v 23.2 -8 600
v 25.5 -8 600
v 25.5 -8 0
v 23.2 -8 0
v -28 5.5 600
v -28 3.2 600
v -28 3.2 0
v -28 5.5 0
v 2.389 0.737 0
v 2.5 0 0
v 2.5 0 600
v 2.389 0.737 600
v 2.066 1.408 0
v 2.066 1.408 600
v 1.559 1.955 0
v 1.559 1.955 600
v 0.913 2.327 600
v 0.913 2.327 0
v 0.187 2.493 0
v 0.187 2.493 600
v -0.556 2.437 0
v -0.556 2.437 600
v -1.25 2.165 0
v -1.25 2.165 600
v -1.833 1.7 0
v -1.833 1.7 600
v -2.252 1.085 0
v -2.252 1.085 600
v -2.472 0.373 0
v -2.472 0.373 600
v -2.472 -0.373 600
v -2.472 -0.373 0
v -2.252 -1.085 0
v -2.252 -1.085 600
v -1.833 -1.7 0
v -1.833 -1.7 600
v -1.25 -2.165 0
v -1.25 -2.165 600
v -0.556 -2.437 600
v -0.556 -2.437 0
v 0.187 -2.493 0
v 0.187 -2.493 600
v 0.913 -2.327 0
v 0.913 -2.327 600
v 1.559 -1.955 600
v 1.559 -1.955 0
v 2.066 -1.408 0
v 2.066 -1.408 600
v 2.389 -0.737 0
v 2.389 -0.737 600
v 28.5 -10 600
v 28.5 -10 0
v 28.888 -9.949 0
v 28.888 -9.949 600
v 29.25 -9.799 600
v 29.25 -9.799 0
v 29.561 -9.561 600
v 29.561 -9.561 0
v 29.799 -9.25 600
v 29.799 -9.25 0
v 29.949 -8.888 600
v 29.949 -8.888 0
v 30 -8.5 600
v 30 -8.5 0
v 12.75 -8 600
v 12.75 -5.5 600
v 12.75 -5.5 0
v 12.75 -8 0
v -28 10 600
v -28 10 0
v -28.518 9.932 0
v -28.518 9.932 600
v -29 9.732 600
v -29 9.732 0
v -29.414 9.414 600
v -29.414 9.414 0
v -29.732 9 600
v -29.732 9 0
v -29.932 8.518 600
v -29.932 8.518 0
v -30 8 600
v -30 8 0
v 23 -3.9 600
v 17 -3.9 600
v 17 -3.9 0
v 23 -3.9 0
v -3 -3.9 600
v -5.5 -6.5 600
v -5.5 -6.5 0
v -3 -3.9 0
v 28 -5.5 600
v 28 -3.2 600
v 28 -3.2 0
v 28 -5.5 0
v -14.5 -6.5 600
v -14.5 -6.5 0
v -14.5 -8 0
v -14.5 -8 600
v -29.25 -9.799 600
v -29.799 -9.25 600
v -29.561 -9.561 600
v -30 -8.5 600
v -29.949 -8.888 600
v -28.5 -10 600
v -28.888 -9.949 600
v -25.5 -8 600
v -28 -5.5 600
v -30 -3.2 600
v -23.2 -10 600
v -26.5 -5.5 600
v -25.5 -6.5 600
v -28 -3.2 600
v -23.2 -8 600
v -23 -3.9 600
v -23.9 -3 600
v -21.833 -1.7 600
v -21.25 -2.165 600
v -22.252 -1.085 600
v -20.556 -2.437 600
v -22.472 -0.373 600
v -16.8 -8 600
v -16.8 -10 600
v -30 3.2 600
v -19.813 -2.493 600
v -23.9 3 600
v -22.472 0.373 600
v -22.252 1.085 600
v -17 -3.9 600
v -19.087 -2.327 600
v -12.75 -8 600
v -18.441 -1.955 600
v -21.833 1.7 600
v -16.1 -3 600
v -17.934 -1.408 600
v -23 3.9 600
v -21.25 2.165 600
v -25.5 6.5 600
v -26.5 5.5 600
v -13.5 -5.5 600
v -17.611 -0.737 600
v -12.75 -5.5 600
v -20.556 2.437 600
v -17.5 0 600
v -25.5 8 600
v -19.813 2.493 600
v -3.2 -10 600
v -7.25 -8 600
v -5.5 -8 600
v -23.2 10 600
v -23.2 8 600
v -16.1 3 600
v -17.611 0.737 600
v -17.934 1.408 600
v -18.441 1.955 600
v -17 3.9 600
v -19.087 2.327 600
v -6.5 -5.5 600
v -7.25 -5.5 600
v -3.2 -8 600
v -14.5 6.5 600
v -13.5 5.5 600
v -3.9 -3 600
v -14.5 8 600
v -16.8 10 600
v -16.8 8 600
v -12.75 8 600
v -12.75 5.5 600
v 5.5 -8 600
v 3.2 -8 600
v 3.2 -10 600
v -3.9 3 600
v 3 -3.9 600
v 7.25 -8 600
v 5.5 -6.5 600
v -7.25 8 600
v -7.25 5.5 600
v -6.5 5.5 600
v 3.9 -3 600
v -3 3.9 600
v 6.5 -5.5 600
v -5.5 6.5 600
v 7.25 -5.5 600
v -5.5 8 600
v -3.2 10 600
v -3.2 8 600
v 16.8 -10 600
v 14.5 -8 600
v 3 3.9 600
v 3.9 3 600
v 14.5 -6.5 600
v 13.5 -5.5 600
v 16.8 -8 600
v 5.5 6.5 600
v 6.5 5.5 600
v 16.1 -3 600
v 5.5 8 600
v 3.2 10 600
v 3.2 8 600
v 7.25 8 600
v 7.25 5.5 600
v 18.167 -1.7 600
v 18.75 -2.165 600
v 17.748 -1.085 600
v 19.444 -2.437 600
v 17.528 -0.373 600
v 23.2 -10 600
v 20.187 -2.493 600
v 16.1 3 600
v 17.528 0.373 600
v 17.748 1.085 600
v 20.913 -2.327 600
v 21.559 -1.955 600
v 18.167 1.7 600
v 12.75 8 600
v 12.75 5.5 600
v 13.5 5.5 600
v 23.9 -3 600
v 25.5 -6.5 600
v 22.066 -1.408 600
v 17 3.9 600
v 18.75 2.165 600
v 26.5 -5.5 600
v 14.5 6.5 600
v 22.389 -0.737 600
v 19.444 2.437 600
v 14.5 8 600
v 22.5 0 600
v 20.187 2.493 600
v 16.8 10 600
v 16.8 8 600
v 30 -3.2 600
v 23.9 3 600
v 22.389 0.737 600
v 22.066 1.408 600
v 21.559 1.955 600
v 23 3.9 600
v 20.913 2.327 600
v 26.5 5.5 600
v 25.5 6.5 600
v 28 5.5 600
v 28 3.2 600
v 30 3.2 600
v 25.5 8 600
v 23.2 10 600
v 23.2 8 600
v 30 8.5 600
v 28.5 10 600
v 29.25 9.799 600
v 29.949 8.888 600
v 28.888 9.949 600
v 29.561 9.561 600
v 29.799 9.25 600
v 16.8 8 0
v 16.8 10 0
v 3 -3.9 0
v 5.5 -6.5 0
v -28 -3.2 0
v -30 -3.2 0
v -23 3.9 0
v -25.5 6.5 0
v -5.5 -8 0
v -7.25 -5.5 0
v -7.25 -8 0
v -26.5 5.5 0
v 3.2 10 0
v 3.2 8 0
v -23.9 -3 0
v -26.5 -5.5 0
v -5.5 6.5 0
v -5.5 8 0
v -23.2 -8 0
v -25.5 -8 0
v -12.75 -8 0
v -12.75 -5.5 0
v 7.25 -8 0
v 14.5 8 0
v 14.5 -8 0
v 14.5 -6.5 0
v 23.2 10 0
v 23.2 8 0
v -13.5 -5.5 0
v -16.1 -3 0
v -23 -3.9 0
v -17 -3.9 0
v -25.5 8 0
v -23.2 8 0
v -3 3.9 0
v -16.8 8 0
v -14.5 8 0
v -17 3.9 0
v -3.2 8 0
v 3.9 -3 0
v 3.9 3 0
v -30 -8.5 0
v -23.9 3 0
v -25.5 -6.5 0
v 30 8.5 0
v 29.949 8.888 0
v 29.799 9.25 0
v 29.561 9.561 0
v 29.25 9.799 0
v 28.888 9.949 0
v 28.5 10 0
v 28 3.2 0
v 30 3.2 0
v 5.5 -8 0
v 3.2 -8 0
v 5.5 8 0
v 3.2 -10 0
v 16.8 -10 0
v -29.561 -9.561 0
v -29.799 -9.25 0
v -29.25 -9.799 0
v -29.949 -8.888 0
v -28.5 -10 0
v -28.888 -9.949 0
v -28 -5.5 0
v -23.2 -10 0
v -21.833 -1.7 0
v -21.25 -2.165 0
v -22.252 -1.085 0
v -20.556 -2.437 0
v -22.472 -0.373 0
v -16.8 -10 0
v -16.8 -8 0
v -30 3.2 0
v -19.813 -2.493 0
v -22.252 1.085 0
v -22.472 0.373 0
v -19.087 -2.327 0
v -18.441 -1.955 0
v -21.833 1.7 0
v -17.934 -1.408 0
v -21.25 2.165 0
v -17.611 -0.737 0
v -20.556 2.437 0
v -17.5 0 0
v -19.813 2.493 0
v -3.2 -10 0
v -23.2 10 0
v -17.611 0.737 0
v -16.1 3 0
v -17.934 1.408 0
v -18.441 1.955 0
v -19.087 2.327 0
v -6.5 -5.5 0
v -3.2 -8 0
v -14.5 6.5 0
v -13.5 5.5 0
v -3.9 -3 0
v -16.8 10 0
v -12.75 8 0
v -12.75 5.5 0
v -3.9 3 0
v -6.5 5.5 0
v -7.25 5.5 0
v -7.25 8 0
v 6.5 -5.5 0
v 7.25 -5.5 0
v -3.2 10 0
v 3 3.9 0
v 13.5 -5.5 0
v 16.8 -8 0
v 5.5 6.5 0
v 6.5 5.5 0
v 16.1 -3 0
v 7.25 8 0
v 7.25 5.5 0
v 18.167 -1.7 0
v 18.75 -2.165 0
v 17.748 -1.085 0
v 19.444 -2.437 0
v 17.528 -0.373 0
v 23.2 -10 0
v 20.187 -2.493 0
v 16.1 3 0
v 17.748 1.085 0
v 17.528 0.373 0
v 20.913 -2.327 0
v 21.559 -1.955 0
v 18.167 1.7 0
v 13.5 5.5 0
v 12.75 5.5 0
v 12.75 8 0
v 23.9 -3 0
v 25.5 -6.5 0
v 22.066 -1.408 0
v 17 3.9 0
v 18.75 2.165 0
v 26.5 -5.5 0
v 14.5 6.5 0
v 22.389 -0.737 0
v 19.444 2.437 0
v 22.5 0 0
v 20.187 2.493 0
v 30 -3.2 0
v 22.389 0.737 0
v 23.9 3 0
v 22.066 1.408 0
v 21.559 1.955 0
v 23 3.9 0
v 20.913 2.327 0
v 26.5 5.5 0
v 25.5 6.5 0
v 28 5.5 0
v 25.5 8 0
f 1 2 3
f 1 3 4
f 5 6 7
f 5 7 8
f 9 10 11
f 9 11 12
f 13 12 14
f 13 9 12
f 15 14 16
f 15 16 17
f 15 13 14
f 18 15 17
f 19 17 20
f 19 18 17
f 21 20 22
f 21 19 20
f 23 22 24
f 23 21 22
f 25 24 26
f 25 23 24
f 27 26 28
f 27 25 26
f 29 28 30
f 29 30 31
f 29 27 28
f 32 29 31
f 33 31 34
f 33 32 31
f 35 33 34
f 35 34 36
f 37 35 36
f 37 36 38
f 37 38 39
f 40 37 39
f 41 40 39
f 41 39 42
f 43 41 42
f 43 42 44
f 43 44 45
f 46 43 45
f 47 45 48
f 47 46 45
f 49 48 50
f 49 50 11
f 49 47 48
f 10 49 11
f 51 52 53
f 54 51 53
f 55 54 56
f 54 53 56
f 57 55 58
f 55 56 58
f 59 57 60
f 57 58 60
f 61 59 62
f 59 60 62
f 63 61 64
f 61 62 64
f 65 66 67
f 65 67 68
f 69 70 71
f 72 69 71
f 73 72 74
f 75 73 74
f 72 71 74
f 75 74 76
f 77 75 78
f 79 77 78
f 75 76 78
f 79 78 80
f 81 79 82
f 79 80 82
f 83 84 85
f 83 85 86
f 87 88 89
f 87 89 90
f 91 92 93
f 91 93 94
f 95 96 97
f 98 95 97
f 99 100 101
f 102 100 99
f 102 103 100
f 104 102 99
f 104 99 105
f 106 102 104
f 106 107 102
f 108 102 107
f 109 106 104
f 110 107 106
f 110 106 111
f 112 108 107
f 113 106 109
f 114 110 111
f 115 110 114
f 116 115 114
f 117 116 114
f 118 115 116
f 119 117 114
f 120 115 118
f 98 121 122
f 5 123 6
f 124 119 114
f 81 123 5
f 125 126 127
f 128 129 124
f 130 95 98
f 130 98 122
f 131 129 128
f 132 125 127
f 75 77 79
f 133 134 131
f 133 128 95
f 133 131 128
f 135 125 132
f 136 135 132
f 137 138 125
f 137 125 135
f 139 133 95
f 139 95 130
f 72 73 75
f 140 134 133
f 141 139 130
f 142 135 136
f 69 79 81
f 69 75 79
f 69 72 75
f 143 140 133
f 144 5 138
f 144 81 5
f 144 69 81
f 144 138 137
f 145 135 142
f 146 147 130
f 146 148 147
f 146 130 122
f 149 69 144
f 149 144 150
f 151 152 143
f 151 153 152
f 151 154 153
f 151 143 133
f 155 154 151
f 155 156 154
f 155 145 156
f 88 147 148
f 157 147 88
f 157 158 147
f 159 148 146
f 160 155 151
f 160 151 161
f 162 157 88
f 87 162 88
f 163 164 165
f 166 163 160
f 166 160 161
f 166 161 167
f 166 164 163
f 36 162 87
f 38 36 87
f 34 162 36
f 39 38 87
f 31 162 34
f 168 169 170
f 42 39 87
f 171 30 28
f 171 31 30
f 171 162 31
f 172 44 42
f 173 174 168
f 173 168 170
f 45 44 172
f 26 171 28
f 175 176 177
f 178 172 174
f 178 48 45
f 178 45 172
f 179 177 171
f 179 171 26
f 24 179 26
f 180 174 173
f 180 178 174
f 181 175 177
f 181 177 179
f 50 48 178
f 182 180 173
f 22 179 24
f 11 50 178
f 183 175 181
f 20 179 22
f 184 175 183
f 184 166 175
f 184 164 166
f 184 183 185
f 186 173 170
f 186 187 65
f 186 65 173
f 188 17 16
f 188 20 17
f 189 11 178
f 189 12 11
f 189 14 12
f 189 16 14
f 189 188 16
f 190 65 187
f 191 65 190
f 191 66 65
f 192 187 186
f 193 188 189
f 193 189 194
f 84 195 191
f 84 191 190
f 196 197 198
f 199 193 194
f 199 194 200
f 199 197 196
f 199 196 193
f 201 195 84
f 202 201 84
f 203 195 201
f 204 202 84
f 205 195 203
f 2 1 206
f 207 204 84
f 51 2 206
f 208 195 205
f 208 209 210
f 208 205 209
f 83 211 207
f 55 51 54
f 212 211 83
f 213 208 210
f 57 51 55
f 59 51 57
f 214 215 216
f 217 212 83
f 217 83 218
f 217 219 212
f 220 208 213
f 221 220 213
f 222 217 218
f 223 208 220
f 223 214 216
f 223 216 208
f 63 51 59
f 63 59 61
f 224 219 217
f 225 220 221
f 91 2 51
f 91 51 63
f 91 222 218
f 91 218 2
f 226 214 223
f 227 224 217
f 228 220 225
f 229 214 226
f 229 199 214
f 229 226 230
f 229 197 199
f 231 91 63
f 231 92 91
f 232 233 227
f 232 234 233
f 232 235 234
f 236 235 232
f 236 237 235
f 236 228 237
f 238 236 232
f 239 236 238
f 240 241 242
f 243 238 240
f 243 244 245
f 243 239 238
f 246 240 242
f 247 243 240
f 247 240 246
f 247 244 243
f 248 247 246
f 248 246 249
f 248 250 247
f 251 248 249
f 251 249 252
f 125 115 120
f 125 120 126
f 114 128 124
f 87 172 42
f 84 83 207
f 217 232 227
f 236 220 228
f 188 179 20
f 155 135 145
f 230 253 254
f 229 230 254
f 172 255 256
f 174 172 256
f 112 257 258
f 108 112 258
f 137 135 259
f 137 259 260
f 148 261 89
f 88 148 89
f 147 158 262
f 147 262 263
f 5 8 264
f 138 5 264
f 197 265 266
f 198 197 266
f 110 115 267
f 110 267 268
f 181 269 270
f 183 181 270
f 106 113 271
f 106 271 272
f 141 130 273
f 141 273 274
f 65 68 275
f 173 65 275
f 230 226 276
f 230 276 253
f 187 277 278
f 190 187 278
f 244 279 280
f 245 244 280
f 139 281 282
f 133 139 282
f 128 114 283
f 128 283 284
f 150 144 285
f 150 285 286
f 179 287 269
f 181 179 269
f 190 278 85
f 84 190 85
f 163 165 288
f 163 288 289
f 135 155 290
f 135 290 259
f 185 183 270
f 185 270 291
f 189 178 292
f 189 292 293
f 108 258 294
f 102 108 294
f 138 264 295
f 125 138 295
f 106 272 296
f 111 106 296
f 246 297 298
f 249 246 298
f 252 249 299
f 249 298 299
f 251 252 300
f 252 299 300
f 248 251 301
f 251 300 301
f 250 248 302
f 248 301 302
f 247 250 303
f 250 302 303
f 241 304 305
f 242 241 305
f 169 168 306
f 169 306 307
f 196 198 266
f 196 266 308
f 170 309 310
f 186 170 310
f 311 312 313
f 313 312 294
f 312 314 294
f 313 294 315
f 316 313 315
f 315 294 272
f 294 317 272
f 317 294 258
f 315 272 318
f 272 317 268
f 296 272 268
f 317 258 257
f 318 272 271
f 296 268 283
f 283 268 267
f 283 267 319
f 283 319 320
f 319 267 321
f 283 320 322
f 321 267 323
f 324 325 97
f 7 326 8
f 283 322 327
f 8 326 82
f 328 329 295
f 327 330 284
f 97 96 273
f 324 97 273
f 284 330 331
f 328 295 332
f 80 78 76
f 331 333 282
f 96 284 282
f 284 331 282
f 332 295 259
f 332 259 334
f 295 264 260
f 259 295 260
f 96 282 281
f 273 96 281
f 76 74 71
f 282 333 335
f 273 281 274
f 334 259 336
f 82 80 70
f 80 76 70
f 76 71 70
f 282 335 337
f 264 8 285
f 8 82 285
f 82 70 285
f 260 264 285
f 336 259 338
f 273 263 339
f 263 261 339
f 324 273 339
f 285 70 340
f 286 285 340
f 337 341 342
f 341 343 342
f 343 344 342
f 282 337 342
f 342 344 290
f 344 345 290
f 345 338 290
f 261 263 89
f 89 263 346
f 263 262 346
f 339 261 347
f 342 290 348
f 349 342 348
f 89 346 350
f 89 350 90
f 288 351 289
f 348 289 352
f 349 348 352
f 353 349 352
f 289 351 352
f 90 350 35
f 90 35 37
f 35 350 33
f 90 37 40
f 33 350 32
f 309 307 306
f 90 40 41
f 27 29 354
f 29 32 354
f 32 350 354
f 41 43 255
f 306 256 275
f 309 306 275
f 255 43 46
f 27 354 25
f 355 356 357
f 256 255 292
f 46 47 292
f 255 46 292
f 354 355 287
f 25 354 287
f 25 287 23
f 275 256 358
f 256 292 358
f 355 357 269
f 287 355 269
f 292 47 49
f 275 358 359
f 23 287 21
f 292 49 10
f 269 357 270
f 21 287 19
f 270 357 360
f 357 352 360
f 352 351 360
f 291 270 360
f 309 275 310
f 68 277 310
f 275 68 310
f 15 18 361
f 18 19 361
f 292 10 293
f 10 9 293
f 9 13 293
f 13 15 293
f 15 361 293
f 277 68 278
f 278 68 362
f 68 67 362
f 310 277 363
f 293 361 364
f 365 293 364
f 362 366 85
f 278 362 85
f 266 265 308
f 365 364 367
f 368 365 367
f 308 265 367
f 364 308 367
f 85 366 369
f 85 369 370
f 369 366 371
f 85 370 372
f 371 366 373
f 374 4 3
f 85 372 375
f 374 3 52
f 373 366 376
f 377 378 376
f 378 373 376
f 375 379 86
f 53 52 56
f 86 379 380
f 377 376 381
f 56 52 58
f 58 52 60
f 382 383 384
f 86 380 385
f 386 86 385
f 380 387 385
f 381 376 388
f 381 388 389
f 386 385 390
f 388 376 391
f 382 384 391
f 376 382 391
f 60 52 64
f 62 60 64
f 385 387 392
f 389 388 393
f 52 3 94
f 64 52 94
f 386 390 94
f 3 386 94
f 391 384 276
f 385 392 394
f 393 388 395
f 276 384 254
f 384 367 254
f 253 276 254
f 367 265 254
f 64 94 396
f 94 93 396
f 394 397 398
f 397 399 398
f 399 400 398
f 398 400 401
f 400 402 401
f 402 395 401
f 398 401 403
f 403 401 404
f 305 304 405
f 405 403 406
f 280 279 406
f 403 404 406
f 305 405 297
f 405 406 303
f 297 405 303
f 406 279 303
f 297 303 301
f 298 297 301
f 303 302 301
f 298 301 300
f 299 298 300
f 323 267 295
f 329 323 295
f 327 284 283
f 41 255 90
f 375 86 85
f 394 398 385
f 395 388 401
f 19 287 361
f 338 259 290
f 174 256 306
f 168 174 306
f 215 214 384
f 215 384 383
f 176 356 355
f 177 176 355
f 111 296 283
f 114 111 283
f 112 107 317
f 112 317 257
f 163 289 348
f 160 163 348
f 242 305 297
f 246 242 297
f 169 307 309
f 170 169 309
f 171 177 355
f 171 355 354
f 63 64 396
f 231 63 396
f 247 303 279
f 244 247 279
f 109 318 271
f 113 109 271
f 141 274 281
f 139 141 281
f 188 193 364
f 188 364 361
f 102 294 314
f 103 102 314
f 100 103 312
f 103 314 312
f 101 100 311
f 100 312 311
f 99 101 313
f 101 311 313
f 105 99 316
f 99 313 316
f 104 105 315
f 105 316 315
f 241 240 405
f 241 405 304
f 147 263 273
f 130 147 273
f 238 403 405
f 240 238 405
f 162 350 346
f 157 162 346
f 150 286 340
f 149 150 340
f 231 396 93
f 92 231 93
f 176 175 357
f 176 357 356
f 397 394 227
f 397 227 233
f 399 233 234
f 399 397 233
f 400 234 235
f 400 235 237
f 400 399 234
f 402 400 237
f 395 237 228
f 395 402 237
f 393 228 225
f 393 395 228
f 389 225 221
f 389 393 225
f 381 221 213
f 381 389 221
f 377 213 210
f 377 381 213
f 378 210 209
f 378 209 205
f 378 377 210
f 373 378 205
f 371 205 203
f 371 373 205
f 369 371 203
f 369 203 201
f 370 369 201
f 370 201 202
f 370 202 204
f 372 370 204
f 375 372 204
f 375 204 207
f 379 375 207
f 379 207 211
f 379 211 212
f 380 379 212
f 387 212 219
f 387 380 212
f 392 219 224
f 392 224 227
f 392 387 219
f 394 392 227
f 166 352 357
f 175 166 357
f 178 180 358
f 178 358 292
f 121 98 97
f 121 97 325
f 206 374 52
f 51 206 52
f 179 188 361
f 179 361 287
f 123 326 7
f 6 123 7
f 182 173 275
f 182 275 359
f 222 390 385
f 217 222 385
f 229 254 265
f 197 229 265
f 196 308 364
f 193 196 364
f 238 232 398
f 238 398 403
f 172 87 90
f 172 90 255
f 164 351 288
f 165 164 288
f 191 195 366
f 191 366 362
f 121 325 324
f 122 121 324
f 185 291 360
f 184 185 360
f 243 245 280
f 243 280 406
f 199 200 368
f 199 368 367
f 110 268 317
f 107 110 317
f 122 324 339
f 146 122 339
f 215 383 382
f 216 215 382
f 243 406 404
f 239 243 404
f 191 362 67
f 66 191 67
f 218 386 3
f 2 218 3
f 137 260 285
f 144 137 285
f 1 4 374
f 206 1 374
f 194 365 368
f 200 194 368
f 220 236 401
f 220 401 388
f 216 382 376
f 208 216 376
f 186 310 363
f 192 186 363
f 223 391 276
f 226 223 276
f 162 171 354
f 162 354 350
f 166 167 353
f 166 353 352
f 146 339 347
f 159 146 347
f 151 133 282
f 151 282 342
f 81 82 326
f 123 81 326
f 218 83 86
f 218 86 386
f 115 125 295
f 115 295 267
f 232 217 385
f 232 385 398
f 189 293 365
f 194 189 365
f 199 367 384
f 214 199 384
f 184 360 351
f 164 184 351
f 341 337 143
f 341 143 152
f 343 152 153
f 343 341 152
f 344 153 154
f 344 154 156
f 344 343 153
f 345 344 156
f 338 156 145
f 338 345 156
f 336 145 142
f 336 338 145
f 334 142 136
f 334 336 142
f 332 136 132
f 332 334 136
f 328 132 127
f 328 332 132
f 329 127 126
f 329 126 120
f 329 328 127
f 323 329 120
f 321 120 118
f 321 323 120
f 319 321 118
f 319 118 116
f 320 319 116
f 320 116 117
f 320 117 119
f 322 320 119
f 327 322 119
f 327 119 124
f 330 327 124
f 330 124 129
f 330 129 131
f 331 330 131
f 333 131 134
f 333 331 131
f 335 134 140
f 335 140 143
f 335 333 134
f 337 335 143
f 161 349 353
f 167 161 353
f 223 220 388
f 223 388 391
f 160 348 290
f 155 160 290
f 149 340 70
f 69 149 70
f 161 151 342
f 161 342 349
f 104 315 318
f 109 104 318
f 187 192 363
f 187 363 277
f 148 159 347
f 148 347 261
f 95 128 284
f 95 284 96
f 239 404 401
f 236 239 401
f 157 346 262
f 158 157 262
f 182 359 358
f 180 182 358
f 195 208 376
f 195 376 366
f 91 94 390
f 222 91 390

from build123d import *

# Parameters (mm, degrees)
SKETCH_1_R      = 2.5
EXTRUDE_2_DEPTH = 600


with BuildPart() as part:
    # 草图1 → 凸台-拉伸2 (new body)
    with BuildSketch(Plane.XY):
        with BuildLine():
            Line((-23.2, 10), (-28, 10))
            ThreePointArc((-28, 10), (-29.414213562, 9.414213562), (-30, 8))
            Line((-30, 8), (-30, 3.2))
            Line((-30, 3.2), (-28, 3.2))
            Line((-28, 3.2), (-28, 5.5))
            Line((-28, 5.5), (-26.5, 5.5))
            Line((-26.5, 5.5), (-23.9, 3))
            Line((-23.9, 3), (-23.9, -3))
            Line((-23.9, -3), (-26.5, -5.5))
            Line((-26.5, -5.5), (-28, -5.5))
            Line((-28, -5.5), (-28, -3.2))
            Line((-28, -3.2), (-30, -3.2))
            Line((-30, -3.2), (-30, -8.5))
            ThreePointArc((-30, -8.5), (-29.560660172, -9.560660172), (-28.5, -10))
            Line((-28.5, -10), (-23.2, -10))
            Line((-23.2, -10), (-23.2, -8))
            Line((-23.2, -8), (-25.5, -8))
            Line((-25.5, -8), (-25.5, -6.5))
            Line((-25.5, -6.5), (-23, -3.9))
            Line((-23, -3.9), (-17, -3.9))
            Line((-17, -3.9), (-14.5, -6.5))
            Line((-14.5, -6.5), (-14.5, -8))
            Line((-14.5, -8), (-16.8, -8))
            Line((-16.8, -8), (-16.8, -10))
            Line((-16.8, -10), (-3.2, -10))
            Line((-3.2, -10), (-3.2, -8))
            Line((-3.2, -8), (-5.5, -8))
            Line((-5.5, -8), (-5.5, -6.5))
            Line((-5.5, -6.5), (-3, -3.9))
            Line((-3, -3.9), (3, -3.9))
            Line((3, -3.9), (5.5, -6.5))
            Line((5.5, -6.5), (5.5, -8))
            Line((5.5, -8), (3.2, -8))
            Line((3.2, -8), (3.2, -10))
            Line((3.2, -10), (16.8, -10))
            Line((16.8, -10), (16.8, -8))
            Line((16.8, -8), (14.5, -8))
            Line((14.5, -8), (14.5, -6.5))
            Line((14.5, -6.5), (17, -3.9))
            Line((17, -3.9), (23, -3.9))
            Line((23, -3.9), (25.5, -6.5))
            Line((25.5, -6.5), (25.5, -8))
            Line((25.5, -8), (23.2, -8))
            Line((23.2, -8), (23.2, -10))
            Line((23.2, -10), (28.5, -10))
            ThreePointArc((28.5, -10), (29.560660172, -9.560660172), (30, -8.5))
            Line((30, -8.5), (30, -3.2))
            Line((30, -3.2), (28, -3.2))
            Line((28, -3.2), (28, -5.5))
            Line((28, -5.5), (26.5, -5.5))
            Line((26.5, -5.5), (23.9, -3))
            Line((23.9, -3), (23.9, 3))
            Line((23.9, 3), (26.5, 5.5))
            Line((26.5, 5.5), (28, 5.5))
            Line((28, 5.5), (28, 3.2))
            Line((28, 3.2), (30, 3.2))
            Line((30, 3.2), (30, 8.5))
            ThreePointArc((30, 8.5), (29.560660172, 9.560660172), (28.5, 10))
            Line((28.5, 10), (23.2, 10))
            Line((23.2, 10), (23.2, 8))
            Line((23.2, 8), (25.5, 8))
            Line((25.5, 8), (25.5, 6.5))
            Line((25.5, 6.5), (23, 3.9))
            Line((23, 3.9), (17, 3.9))
            Line((17, 3.9), (14.5, 6.5))
            Line((14.5, 6.5), (14.5, 8))
            Line((14.5, 8), (16.8, 8))
            Line((16.8, 8), (16.8, 10))
            Line((16.8, 10), (3.2, 10))
            Line((3.2, 10), (3.2, 8))
            Line((3.2, 8), (5.5, 8))
            Line((5.5, 8), (5.5, 6.5))
            Line((5.5, 6.5), (3, 3.9))
            Line((3, 3.9), (-3, 3.9))
            Line((-3, 3.9), (-5.5, 6.5))
            Line((-5.5, 6.5), (-5.5, 8))
            Line((-5.5, 8), (-3.2, 8))
            Line((-3.2, 8), (-3.2, 10))
            Line((-3.2, 10), (-16.8, 10))
            Line((-16.8, 10), (-16.8, 8))
            Line((-16.8, 8), (-14.5, 8))
            Line((-14.5, 8), (-14.5, 6.5))
            Line((-14.5, 6.5), (-17, 3.9))
            Line((-17, 3.9), (-23, 3.9))
            Line((-23, 3.9), (-25.5, 6.5))
            Line((-25.5, 6.5), (-25.5, 8))
            Line((-25.5, 8), (-23.2, 8))
            Line((-23.2, 8), (-23.2, 10))
        make_face()
        Polygon((-12.75, -8), (-12.75, -5.5), (-13.5, -5.5), (-16.1, -3), (-16.1, 3), (-13.5, 5.5), (-12.75, 5.5), (-12.75, 8), (-7.25, 8), (-7.25, 5.5), (-6.5, 5.5), (-3.9, 3), (-3.9, -3), (-6.5, -5.5), (-7.25, -5.5), (-7.25, -8), align=None, mode=Mode.SUBTRACT)
        Polygon((6.5, -5.5), (3.9, -3), (3.9, 3), (6.5, 5.5), (7.25, 5.5), (7.25, 8), (12.75, 8), (12.75, 5.5), (13.5, 5.5), (16.1, 3), (16.1, -3), (13.5, -5.5), (12.75, -5.5), (12.75, -8), (7.25, -8), (7.25, -5.5), align=None, mode=Mode.SUBTRACT)
        with Locations((20, 0)):
            Circle(SKETCH_1_R, mode=Mode.SUBTRACT)
        with Locations((-20, 0)):
            Circle(SKETCH_1_R, mode=Mode.SUBTRACT)
        Circle(SKETCH_1_R, mode=Mode.SUBTRACT)
    extrude(amount=EXTRUDE_2_DEPTH)


solid = part.part
